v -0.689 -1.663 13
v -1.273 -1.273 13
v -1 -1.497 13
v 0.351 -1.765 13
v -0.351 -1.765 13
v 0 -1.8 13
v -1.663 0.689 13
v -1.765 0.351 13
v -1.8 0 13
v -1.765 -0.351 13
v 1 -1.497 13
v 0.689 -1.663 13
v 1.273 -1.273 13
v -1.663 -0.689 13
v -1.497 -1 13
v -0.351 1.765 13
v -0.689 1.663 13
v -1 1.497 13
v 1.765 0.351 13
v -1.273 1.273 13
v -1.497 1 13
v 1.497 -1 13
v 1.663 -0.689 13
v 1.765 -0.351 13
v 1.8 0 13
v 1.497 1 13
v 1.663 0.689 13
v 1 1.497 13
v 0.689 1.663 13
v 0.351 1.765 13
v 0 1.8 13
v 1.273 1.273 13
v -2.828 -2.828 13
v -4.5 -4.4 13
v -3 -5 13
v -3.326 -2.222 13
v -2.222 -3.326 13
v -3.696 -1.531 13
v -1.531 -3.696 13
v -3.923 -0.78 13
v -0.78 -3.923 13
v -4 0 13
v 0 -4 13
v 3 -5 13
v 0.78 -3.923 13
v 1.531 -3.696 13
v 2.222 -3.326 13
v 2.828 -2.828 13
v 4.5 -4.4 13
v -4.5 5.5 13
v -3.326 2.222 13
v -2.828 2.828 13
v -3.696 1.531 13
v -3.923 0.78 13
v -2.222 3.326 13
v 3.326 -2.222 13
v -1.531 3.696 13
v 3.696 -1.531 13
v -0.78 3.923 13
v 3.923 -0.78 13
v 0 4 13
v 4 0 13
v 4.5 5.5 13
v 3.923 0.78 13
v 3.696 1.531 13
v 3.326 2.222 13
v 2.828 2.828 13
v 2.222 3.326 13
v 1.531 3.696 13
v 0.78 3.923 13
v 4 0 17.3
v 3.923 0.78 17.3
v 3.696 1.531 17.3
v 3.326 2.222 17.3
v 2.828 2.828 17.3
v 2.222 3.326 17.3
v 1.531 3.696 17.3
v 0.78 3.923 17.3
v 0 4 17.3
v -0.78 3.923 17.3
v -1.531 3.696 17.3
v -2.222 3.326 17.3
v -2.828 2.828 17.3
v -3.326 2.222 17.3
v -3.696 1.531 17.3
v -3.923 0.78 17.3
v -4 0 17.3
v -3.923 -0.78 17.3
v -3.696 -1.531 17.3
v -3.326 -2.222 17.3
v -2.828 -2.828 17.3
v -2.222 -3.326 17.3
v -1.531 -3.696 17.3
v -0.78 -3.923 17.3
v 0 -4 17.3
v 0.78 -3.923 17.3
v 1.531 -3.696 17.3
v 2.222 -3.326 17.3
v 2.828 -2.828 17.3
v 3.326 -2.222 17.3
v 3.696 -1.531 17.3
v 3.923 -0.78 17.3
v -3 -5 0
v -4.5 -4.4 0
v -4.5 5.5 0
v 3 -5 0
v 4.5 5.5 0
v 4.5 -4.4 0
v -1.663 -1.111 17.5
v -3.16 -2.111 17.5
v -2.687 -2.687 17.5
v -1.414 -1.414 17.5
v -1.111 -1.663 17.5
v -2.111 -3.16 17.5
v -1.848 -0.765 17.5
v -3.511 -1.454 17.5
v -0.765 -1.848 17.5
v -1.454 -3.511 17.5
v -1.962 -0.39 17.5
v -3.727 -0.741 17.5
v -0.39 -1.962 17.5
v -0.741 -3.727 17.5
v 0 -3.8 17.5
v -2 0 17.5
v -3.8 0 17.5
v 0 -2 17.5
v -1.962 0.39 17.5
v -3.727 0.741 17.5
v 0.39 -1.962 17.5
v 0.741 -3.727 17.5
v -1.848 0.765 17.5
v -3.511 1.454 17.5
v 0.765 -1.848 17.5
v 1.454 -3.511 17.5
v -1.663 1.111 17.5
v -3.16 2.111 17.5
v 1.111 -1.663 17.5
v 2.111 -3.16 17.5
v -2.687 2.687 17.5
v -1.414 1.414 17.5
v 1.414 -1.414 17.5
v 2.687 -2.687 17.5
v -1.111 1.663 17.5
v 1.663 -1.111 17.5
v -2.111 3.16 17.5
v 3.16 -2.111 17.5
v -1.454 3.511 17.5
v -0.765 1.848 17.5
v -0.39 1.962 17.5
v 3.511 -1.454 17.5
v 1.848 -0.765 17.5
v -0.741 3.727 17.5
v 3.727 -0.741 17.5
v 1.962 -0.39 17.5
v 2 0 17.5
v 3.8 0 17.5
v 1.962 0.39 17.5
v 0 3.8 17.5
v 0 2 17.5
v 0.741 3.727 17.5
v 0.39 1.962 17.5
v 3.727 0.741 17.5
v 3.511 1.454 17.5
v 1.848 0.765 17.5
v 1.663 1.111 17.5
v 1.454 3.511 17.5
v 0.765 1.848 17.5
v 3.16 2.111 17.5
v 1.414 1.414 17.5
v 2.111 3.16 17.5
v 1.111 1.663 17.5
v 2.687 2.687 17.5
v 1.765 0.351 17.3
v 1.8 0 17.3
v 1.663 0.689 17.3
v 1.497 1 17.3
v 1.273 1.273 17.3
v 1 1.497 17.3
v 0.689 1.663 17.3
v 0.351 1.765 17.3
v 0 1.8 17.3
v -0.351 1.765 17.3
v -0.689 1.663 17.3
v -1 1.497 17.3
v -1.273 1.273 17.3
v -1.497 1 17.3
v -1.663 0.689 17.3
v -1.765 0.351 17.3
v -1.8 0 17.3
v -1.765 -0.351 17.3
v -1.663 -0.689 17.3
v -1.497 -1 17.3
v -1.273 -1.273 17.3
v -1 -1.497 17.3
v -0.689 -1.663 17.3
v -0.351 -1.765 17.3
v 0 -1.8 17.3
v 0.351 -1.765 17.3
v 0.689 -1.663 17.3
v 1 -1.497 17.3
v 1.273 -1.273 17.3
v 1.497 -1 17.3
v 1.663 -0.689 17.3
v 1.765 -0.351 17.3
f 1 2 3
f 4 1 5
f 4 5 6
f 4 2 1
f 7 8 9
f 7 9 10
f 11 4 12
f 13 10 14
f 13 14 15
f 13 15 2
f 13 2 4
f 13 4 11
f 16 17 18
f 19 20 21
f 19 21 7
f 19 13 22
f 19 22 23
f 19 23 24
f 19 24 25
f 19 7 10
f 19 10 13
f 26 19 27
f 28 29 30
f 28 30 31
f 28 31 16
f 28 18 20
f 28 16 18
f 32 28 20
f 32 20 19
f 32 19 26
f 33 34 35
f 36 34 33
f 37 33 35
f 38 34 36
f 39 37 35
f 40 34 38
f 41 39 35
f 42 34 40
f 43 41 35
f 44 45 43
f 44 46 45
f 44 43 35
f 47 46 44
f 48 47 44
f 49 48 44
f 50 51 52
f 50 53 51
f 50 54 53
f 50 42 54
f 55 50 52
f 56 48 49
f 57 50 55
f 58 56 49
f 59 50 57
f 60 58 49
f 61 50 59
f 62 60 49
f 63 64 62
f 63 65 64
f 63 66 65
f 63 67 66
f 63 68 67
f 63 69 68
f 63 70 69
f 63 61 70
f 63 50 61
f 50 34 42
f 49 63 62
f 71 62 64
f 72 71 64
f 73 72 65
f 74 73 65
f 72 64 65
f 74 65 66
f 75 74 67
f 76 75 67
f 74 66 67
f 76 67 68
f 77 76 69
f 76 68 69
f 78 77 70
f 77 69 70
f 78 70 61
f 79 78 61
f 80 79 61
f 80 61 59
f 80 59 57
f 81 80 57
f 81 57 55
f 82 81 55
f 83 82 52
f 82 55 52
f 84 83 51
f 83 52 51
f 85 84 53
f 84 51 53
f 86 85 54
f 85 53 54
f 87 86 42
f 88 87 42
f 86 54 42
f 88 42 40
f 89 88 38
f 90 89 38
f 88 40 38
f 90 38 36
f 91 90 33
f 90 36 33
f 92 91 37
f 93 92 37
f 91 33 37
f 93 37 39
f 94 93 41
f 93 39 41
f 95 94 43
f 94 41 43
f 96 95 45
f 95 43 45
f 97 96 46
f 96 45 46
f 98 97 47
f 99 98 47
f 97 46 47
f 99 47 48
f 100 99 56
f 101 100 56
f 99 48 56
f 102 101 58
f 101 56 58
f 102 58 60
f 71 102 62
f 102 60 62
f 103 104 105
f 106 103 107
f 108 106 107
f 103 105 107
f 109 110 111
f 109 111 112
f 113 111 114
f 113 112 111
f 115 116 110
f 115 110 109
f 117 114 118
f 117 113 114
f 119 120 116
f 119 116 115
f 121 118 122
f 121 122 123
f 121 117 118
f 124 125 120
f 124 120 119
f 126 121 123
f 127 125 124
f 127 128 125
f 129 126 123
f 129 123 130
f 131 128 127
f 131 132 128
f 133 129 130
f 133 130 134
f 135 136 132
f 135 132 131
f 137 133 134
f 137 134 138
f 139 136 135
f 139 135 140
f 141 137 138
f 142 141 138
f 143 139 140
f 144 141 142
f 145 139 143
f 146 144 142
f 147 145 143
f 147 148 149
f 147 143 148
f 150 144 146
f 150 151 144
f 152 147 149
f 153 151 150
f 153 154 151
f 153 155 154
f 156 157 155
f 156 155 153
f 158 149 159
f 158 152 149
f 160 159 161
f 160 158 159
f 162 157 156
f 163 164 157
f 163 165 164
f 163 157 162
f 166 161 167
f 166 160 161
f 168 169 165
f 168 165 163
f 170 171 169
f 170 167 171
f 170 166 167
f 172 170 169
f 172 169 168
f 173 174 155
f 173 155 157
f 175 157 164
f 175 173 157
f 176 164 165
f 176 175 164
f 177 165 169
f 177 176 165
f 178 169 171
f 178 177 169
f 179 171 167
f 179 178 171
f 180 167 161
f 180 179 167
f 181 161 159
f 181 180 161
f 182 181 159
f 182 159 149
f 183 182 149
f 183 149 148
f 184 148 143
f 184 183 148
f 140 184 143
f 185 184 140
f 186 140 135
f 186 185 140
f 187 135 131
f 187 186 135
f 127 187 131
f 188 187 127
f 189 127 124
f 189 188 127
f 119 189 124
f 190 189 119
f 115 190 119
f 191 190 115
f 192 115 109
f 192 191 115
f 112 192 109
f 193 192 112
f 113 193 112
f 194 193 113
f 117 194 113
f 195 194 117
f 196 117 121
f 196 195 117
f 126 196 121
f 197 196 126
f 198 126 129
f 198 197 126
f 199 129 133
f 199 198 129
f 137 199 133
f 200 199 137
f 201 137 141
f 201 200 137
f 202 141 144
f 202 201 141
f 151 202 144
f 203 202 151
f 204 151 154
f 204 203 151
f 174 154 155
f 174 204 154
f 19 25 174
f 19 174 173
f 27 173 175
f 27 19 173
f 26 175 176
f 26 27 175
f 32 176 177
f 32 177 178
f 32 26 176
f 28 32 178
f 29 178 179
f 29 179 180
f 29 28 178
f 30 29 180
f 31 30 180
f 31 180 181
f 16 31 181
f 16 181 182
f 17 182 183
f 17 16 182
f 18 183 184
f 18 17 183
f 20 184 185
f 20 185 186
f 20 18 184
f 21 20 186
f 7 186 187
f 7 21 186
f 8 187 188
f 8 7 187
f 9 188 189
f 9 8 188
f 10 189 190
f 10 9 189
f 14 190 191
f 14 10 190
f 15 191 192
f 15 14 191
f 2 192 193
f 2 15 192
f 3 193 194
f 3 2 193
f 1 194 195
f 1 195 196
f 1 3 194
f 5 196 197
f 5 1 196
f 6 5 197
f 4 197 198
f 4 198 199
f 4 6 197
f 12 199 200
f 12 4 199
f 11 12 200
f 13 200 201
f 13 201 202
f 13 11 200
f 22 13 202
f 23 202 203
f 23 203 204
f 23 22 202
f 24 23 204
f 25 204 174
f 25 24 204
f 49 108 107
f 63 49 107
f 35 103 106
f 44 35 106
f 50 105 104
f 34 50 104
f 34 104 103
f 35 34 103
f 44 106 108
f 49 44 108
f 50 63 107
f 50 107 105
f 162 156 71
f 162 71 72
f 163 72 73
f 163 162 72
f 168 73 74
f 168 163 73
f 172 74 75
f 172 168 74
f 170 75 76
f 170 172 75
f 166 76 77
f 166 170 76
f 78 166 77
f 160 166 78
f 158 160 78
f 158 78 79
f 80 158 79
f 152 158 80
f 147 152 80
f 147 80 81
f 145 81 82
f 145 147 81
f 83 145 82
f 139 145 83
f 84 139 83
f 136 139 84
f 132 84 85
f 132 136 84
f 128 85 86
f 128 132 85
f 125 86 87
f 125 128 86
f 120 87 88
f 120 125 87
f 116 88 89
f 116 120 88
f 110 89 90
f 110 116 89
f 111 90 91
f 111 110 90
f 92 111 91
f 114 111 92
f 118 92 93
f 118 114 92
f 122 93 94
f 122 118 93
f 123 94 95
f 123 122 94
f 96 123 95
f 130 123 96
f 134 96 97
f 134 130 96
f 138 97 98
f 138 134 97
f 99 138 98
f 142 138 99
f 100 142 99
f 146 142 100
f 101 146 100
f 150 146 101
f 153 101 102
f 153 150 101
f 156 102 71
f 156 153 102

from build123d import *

# Parameters (mm, degrees)
F1_DEPTH = 13
F2_R     = 4
F2_R_2   = 1.8
F3_DEPTH = 4.5
F4_SIZE  = 0.2


with BuildPart() as f1:
    # F0 (on Top) → F1 (new body)
    with BuildSketch(Plane.XY):
        Polygon((4.5, 5.5), (0, 5.5), (-4.5, 5.5), (-4.5, -4.4), (-3, -5), (0, -5), (3, -5), (4.5, -4.4), align=None)
    extrude(amount=F1_DEPTH)

    # F2 (on face) → F3 (join)
    with BuildSketch(Plane.XY.offset(13)):
        Circle(F2_R)
        Circle(F2_R_2, mode=Mode.SUBTRACT)
    extrude(amount=F3_DEPTH)

    # F4
    f4_edges = [f1.edges().sort_by_distance(p)[0] for p in [
        (-4, 0, 17.5),
        (-1.8, 0, 17.5),
    ]]
    chamfer(f4_edges, length=F4_SIZE)


solid = f1.part
